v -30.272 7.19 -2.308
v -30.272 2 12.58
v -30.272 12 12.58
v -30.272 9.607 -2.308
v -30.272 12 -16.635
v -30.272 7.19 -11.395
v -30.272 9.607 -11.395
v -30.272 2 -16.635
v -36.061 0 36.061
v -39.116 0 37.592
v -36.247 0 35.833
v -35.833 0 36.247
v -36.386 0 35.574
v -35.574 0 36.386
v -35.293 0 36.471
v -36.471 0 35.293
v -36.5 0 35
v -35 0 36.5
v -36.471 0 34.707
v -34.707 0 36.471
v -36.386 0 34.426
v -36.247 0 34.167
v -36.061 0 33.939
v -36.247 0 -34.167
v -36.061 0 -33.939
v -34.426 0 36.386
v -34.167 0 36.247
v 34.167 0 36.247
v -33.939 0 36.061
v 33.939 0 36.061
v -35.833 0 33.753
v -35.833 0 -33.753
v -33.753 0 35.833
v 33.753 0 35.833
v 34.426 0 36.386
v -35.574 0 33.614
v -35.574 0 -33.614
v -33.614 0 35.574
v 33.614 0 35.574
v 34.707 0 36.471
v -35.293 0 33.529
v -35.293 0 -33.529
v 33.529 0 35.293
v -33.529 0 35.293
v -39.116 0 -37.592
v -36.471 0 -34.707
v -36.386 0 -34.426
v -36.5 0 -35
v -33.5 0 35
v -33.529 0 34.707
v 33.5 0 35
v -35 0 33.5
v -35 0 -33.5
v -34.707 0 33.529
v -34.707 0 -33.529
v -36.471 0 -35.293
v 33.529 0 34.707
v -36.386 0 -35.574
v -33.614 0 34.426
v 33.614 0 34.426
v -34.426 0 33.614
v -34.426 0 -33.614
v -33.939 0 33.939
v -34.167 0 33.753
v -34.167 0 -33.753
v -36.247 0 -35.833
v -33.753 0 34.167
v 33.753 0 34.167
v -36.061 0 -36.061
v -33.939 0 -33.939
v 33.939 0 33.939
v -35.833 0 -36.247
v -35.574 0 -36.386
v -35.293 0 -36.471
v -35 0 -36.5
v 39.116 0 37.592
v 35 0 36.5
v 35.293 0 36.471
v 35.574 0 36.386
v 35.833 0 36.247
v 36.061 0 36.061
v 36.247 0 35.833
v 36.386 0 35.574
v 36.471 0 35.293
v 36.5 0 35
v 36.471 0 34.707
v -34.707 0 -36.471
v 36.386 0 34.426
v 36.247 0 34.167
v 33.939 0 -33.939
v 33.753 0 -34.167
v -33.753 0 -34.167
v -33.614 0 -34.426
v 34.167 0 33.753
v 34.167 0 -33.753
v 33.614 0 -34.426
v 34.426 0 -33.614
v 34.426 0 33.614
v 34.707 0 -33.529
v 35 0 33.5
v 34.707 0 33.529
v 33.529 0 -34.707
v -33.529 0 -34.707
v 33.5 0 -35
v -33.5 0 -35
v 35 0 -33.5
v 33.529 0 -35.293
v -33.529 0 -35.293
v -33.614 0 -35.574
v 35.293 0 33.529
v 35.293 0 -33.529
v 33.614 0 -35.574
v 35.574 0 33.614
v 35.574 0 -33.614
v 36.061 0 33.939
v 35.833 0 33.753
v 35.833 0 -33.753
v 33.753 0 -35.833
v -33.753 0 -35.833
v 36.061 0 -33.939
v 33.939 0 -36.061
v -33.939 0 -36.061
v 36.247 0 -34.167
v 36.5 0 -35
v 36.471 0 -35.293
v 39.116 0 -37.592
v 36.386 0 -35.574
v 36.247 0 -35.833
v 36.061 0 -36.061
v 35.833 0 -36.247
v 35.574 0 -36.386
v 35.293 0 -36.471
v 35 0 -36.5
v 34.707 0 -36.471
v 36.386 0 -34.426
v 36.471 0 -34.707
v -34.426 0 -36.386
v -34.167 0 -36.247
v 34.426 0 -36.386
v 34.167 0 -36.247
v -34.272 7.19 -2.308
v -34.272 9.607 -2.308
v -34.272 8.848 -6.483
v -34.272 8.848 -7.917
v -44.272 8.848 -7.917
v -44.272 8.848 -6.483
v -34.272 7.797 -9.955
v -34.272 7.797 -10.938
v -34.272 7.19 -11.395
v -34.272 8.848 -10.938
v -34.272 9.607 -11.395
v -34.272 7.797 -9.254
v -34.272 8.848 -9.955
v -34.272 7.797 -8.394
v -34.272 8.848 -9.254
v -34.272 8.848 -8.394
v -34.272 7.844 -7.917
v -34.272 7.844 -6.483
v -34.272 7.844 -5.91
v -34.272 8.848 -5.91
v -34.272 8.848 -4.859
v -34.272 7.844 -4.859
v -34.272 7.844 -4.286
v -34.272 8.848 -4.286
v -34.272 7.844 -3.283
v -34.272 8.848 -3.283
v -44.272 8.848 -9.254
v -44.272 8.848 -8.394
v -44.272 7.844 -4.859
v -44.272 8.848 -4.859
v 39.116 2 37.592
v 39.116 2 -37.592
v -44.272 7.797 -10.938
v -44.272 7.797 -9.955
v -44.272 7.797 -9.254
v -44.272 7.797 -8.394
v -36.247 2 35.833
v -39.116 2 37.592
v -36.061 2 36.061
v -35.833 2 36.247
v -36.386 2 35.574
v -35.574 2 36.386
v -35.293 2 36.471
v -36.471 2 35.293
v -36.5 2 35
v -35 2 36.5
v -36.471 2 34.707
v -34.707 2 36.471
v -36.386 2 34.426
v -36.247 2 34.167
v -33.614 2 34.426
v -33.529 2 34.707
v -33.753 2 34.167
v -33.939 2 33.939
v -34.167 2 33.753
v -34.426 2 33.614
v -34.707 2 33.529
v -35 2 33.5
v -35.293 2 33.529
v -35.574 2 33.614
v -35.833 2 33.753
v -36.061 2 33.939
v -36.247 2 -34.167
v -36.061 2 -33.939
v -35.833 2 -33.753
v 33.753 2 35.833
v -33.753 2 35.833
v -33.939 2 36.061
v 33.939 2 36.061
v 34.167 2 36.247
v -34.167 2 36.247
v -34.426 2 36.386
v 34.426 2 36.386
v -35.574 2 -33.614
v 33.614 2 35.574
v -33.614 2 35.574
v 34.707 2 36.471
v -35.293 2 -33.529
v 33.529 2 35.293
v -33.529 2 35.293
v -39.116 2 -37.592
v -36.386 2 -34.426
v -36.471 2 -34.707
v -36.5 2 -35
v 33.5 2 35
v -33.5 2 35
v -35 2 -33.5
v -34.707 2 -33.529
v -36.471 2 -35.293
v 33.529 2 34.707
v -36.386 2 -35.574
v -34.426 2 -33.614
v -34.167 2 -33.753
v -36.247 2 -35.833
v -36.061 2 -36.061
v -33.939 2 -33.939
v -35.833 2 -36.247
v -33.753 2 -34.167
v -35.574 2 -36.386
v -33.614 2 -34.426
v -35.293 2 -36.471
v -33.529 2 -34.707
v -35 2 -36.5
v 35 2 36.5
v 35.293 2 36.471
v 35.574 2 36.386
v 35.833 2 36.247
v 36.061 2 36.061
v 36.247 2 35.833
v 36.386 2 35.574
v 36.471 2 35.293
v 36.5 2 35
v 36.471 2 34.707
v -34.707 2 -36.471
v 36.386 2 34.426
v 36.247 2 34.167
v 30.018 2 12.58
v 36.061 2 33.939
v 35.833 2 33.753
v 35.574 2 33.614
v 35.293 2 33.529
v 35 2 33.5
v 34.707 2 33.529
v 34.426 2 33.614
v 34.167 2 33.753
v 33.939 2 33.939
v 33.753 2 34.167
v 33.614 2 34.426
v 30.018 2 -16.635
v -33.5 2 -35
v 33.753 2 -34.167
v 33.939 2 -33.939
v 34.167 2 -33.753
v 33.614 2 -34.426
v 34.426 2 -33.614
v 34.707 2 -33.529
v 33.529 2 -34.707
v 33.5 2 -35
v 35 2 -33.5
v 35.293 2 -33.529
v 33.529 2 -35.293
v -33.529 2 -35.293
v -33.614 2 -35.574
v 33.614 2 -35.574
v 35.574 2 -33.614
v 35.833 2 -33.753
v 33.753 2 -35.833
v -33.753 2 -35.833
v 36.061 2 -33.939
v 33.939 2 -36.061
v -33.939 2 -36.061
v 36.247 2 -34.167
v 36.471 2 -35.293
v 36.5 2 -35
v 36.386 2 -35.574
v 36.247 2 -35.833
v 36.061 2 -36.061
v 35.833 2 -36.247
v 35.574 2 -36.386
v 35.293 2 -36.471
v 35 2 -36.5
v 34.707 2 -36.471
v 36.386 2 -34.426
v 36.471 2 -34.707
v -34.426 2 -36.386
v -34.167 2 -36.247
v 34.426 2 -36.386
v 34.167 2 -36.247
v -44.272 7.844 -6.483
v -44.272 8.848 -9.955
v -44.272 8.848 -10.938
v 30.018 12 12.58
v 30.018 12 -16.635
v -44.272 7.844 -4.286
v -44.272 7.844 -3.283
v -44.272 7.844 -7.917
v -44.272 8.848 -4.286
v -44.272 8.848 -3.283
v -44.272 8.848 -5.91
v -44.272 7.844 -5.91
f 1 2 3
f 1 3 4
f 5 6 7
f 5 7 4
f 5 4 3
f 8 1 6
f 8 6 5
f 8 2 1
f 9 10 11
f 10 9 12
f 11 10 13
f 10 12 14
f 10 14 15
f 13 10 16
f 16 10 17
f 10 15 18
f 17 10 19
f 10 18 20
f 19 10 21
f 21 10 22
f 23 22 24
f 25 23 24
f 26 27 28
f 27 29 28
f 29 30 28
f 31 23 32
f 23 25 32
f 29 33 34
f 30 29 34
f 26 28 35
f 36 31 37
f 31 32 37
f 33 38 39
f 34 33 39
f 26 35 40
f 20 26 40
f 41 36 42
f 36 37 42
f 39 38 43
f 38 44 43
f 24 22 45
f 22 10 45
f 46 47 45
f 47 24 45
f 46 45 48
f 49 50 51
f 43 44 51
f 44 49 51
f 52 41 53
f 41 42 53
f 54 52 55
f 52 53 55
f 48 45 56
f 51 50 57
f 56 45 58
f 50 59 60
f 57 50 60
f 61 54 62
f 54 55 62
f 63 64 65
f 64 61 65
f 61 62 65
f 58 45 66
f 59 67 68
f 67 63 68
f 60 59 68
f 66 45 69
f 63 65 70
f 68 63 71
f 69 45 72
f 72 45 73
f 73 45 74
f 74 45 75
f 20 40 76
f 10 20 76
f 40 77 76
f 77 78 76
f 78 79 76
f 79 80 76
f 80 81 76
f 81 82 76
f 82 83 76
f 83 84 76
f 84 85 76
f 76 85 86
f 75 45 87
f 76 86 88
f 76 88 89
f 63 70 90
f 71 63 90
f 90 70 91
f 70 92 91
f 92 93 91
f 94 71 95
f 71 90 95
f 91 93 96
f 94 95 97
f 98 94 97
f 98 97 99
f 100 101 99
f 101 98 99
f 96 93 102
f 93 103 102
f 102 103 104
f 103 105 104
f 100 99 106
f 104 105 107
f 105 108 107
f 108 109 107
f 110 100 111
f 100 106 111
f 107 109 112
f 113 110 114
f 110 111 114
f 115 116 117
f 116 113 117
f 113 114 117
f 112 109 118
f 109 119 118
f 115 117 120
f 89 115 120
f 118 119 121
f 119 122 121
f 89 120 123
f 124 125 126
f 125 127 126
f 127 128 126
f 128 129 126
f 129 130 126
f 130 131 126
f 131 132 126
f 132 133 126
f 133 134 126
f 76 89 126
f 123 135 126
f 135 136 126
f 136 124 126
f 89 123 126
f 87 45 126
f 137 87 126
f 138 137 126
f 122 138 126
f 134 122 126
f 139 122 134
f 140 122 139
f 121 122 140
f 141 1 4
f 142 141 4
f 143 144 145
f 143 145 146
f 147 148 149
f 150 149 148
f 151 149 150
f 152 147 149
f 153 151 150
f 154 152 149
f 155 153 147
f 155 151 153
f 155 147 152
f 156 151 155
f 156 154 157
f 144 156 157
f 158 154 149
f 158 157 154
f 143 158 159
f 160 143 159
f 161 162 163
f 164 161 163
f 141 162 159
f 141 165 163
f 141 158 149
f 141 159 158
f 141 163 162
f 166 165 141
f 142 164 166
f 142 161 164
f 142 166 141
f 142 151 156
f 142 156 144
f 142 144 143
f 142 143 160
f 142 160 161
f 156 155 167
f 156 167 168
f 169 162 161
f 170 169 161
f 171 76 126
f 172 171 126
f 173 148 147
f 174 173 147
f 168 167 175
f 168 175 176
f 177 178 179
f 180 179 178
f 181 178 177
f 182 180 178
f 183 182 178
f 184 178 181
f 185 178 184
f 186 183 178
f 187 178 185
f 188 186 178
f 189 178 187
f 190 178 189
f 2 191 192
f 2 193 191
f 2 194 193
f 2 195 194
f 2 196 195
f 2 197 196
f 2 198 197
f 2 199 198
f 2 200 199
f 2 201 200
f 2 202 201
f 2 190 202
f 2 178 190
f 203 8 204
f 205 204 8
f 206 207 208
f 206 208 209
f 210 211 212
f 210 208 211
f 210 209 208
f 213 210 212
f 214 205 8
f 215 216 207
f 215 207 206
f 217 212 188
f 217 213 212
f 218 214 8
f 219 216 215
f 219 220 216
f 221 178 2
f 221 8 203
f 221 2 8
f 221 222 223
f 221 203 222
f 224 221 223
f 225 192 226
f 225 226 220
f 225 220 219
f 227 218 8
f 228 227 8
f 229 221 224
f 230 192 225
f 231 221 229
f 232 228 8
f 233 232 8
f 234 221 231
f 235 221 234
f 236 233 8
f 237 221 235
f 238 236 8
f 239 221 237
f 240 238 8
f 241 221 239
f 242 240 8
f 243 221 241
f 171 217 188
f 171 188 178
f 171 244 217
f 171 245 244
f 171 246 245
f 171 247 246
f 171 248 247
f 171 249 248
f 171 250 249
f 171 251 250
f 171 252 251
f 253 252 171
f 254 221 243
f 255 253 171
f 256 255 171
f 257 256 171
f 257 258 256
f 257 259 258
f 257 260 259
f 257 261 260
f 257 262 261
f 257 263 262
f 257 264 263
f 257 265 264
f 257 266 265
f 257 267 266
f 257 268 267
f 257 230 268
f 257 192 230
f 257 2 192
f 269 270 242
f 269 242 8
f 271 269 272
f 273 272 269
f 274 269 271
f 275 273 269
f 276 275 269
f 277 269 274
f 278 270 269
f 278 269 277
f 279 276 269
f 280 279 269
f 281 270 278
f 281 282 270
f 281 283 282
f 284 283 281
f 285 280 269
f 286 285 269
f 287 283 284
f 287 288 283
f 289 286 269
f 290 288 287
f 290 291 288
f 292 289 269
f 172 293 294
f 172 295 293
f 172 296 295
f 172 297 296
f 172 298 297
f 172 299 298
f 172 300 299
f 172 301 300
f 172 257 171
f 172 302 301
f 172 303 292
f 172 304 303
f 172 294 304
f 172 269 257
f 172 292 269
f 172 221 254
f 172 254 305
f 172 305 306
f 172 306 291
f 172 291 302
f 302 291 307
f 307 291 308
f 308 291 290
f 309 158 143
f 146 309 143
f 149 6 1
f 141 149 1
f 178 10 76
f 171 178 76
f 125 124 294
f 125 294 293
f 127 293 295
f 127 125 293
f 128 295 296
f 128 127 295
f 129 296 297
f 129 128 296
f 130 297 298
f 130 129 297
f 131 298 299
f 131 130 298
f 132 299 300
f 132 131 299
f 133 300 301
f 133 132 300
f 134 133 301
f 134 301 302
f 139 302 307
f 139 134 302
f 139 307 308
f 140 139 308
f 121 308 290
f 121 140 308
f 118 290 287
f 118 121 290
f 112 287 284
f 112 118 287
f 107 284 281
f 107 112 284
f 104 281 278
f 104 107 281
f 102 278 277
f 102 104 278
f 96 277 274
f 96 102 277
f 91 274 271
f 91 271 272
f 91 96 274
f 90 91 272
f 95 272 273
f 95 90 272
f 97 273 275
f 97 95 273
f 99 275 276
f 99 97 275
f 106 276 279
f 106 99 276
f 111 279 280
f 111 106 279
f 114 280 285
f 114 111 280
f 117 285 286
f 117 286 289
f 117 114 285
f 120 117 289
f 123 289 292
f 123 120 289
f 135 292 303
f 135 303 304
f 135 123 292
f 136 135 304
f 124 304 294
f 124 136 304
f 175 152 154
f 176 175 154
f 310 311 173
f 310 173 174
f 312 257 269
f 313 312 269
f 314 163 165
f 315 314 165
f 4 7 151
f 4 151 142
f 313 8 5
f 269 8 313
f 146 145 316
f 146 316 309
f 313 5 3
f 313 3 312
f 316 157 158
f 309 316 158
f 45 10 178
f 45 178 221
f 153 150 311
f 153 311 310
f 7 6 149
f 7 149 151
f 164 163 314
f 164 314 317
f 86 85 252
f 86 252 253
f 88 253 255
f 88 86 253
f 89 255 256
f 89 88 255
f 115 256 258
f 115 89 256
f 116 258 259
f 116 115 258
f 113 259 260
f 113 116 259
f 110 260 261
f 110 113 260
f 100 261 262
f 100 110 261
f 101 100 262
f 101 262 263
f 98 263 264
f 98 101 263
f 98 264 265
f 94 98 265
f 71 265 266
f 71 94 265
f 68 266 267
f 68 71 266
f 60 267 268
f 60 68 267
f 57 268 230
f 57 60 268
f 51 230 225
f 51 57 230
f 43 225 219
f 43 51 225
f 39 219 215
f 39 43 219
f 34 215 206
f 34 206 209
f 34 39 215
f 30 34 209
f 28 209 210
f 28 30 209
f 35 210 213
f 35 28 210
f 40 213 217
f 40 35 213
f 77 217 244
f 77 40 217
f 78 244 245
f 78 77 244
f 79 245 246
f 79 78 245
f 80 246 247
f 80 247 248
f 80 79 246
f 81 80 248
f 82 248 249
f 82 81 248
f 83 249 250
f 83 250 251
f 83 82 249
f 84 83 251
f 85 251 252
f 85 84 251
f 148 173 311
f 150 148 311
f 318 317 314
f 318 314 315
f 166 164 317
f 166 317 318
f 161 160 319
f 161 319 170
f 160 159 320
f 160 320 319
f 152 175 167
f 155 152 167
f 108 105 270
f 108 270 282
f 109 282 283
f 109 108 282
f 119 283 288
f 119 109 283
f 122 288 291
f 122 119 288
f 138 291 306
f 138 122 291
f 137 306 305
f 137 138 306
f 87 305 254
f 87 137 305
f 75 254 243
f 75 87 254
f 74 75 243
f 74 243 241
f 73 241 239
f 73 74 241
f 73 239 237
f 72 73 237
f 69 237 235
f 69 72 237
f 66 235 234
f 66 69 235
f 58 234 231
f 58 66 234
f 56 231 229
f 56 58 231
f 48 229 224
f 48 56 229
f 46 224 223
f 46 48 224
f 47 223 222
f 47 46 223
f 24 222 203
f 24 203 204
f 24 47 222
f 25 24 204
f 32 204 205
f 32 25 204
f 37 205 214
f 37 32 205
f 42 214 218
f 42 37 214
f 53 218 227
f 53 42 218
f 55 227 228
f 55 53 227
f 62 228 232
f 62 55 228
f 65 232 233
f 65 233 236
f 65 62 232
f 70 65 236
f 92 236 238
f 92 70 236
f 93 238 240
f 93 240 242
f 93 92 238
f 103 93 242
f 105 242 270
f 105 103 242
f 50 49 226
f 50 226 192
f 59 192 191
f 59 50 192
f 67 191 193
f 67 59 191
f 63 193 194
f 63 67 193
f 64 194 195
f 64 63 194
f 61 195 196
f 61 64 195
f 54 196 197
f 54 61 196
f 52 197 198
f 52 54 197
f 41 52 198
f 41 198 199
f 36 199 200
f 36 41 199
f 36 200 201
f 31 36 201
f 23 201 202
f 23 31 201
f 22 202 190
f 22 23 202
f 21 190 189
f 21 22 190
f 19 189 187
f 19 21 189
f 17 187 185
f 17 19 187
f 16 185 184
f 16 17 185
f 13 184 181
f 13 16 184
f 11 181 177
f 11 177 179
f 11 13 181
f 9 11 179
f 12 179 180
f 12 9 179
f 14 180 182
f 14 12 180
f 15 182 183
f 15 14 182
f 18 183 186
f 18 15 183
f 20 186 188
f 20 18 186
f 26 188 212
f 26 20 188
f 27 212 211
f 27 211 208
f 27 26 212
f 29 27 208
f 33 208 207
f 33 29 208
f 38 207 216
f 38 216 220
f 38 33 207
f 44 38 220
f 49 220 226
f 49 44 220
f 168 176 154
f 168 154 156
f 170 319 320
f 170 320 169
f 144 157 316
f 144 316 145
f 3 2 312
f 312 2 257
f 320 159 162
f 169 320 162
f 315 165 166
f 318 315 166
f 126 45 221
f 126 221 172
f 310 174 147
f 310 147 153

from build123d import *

# Parameters (mm, degrees)
SKETCH_2_W      = 78.232
SKETCH_2_H      = 75.184
SKETCH_2_R      = 1.5
EXTRUDE_1_DEPTH = 2
SKETCH_4_W      = 60.289914042
SKETCH_4_H      = 29.214557113
EXTRUDE_2_DEPTH = 10
SKETCH_5_W      = 9.086617177
SKETCH_5_H      = 2.41728743
EXTRUDE_3_DEPTH = 4
SKETCH_6_W      = 0.859863671
SKETCH_6_H      = 1.050944487
SKETCH_6_W_2    = 1.433106119
SKETCH_6_H_2    = 1.003174283
SKETCH_6_W_3    = 1.050944487
SKETCH_6_W_4    = 1.003174283
SKETCH_6_W_5    = 0.983317738
EXTRUDE_4_DEPTH = 10


with BuildPart() as part:
    # 草图2 → 凸台-拉伸1 (new body)
    with BuildSketch(Plane(origin=(0, 0, 0), x_dir=(1, 0, 0), z_dir=(0, 1, 0))):
        Rectangle(SKETCH_2_W, SKETCH_2_H)
        with Locations((35, -35)):
            Circle(SKETCH_2_R, mode=Mode.SUBTRACT)
        with Locations((35, 35)):
            Circle(SKETCH_2_R, mode=Mode.SUBTRACT)
        with Locations((-35, 35)):
            Circle(SKETCH_2_R, mode=Mode.SUBTRACT)
        with Locations((-35, -35)):
            Circle(SKETCH_2_R, mode=Mode.SUBTRACT)
    extrude(amount=EXTRUDE_1_DEPTH)

    # 草图4 → 凸台-拉伸2 (add)
    with BuildSketch(Plane(origin=(0, 2, 0), x_dir=(1, 0, 0), z_dir=(0, 1, 0))):
        with Locations((-0.127049012, 2.027434591)):
            Rectangle(SKETCH_4_W, SKETCH_4_H)
    extrude(amount=EXTRUDE_2_DEPTH)

    # 草图5 → 凸台-拉伸3 (add)
    with BuildSketch(Plane.ZY.offset(30.272006033)):
        with Locations((-6.851231395, 8.39841401)):
            Rectangle(SKETCH_5_W, SKETCH_5_H)
    extrude(amount=EXTRUDE_3_DEPTH)

    # 草图6 → 凸台-拉伸4 (add)
    with BuildSketch(Plane.ZY.offset(34.272006033)):
        with Locations((-8.824134234, 8.322199757)):
            Rectangle(SKETCH_6_W, SKETCH_6_H)
        with Locations((-7.199947299, 8.346084859)):
            Rectangle(SKETCH_6_W_2, SKETCH_6_H_2)
        with Locations((-5.384679549, 8.346084859)):
            Rectangle(SKETCH_6_W_3, SKETCH_6_H_2)
        with Locations((-3.784377716, 8.346084859)):
            Rectangle(SKETCH_6_W_4, SKETCH_6_H_2)
        with Locations((-10.446641143, 8.322199757)):
            Rectangle(SKETCH_6_W_5, SKETCH_6_H)
    extrude(amount=EXTRUDE_4_DEPTH)


solid = part.part
